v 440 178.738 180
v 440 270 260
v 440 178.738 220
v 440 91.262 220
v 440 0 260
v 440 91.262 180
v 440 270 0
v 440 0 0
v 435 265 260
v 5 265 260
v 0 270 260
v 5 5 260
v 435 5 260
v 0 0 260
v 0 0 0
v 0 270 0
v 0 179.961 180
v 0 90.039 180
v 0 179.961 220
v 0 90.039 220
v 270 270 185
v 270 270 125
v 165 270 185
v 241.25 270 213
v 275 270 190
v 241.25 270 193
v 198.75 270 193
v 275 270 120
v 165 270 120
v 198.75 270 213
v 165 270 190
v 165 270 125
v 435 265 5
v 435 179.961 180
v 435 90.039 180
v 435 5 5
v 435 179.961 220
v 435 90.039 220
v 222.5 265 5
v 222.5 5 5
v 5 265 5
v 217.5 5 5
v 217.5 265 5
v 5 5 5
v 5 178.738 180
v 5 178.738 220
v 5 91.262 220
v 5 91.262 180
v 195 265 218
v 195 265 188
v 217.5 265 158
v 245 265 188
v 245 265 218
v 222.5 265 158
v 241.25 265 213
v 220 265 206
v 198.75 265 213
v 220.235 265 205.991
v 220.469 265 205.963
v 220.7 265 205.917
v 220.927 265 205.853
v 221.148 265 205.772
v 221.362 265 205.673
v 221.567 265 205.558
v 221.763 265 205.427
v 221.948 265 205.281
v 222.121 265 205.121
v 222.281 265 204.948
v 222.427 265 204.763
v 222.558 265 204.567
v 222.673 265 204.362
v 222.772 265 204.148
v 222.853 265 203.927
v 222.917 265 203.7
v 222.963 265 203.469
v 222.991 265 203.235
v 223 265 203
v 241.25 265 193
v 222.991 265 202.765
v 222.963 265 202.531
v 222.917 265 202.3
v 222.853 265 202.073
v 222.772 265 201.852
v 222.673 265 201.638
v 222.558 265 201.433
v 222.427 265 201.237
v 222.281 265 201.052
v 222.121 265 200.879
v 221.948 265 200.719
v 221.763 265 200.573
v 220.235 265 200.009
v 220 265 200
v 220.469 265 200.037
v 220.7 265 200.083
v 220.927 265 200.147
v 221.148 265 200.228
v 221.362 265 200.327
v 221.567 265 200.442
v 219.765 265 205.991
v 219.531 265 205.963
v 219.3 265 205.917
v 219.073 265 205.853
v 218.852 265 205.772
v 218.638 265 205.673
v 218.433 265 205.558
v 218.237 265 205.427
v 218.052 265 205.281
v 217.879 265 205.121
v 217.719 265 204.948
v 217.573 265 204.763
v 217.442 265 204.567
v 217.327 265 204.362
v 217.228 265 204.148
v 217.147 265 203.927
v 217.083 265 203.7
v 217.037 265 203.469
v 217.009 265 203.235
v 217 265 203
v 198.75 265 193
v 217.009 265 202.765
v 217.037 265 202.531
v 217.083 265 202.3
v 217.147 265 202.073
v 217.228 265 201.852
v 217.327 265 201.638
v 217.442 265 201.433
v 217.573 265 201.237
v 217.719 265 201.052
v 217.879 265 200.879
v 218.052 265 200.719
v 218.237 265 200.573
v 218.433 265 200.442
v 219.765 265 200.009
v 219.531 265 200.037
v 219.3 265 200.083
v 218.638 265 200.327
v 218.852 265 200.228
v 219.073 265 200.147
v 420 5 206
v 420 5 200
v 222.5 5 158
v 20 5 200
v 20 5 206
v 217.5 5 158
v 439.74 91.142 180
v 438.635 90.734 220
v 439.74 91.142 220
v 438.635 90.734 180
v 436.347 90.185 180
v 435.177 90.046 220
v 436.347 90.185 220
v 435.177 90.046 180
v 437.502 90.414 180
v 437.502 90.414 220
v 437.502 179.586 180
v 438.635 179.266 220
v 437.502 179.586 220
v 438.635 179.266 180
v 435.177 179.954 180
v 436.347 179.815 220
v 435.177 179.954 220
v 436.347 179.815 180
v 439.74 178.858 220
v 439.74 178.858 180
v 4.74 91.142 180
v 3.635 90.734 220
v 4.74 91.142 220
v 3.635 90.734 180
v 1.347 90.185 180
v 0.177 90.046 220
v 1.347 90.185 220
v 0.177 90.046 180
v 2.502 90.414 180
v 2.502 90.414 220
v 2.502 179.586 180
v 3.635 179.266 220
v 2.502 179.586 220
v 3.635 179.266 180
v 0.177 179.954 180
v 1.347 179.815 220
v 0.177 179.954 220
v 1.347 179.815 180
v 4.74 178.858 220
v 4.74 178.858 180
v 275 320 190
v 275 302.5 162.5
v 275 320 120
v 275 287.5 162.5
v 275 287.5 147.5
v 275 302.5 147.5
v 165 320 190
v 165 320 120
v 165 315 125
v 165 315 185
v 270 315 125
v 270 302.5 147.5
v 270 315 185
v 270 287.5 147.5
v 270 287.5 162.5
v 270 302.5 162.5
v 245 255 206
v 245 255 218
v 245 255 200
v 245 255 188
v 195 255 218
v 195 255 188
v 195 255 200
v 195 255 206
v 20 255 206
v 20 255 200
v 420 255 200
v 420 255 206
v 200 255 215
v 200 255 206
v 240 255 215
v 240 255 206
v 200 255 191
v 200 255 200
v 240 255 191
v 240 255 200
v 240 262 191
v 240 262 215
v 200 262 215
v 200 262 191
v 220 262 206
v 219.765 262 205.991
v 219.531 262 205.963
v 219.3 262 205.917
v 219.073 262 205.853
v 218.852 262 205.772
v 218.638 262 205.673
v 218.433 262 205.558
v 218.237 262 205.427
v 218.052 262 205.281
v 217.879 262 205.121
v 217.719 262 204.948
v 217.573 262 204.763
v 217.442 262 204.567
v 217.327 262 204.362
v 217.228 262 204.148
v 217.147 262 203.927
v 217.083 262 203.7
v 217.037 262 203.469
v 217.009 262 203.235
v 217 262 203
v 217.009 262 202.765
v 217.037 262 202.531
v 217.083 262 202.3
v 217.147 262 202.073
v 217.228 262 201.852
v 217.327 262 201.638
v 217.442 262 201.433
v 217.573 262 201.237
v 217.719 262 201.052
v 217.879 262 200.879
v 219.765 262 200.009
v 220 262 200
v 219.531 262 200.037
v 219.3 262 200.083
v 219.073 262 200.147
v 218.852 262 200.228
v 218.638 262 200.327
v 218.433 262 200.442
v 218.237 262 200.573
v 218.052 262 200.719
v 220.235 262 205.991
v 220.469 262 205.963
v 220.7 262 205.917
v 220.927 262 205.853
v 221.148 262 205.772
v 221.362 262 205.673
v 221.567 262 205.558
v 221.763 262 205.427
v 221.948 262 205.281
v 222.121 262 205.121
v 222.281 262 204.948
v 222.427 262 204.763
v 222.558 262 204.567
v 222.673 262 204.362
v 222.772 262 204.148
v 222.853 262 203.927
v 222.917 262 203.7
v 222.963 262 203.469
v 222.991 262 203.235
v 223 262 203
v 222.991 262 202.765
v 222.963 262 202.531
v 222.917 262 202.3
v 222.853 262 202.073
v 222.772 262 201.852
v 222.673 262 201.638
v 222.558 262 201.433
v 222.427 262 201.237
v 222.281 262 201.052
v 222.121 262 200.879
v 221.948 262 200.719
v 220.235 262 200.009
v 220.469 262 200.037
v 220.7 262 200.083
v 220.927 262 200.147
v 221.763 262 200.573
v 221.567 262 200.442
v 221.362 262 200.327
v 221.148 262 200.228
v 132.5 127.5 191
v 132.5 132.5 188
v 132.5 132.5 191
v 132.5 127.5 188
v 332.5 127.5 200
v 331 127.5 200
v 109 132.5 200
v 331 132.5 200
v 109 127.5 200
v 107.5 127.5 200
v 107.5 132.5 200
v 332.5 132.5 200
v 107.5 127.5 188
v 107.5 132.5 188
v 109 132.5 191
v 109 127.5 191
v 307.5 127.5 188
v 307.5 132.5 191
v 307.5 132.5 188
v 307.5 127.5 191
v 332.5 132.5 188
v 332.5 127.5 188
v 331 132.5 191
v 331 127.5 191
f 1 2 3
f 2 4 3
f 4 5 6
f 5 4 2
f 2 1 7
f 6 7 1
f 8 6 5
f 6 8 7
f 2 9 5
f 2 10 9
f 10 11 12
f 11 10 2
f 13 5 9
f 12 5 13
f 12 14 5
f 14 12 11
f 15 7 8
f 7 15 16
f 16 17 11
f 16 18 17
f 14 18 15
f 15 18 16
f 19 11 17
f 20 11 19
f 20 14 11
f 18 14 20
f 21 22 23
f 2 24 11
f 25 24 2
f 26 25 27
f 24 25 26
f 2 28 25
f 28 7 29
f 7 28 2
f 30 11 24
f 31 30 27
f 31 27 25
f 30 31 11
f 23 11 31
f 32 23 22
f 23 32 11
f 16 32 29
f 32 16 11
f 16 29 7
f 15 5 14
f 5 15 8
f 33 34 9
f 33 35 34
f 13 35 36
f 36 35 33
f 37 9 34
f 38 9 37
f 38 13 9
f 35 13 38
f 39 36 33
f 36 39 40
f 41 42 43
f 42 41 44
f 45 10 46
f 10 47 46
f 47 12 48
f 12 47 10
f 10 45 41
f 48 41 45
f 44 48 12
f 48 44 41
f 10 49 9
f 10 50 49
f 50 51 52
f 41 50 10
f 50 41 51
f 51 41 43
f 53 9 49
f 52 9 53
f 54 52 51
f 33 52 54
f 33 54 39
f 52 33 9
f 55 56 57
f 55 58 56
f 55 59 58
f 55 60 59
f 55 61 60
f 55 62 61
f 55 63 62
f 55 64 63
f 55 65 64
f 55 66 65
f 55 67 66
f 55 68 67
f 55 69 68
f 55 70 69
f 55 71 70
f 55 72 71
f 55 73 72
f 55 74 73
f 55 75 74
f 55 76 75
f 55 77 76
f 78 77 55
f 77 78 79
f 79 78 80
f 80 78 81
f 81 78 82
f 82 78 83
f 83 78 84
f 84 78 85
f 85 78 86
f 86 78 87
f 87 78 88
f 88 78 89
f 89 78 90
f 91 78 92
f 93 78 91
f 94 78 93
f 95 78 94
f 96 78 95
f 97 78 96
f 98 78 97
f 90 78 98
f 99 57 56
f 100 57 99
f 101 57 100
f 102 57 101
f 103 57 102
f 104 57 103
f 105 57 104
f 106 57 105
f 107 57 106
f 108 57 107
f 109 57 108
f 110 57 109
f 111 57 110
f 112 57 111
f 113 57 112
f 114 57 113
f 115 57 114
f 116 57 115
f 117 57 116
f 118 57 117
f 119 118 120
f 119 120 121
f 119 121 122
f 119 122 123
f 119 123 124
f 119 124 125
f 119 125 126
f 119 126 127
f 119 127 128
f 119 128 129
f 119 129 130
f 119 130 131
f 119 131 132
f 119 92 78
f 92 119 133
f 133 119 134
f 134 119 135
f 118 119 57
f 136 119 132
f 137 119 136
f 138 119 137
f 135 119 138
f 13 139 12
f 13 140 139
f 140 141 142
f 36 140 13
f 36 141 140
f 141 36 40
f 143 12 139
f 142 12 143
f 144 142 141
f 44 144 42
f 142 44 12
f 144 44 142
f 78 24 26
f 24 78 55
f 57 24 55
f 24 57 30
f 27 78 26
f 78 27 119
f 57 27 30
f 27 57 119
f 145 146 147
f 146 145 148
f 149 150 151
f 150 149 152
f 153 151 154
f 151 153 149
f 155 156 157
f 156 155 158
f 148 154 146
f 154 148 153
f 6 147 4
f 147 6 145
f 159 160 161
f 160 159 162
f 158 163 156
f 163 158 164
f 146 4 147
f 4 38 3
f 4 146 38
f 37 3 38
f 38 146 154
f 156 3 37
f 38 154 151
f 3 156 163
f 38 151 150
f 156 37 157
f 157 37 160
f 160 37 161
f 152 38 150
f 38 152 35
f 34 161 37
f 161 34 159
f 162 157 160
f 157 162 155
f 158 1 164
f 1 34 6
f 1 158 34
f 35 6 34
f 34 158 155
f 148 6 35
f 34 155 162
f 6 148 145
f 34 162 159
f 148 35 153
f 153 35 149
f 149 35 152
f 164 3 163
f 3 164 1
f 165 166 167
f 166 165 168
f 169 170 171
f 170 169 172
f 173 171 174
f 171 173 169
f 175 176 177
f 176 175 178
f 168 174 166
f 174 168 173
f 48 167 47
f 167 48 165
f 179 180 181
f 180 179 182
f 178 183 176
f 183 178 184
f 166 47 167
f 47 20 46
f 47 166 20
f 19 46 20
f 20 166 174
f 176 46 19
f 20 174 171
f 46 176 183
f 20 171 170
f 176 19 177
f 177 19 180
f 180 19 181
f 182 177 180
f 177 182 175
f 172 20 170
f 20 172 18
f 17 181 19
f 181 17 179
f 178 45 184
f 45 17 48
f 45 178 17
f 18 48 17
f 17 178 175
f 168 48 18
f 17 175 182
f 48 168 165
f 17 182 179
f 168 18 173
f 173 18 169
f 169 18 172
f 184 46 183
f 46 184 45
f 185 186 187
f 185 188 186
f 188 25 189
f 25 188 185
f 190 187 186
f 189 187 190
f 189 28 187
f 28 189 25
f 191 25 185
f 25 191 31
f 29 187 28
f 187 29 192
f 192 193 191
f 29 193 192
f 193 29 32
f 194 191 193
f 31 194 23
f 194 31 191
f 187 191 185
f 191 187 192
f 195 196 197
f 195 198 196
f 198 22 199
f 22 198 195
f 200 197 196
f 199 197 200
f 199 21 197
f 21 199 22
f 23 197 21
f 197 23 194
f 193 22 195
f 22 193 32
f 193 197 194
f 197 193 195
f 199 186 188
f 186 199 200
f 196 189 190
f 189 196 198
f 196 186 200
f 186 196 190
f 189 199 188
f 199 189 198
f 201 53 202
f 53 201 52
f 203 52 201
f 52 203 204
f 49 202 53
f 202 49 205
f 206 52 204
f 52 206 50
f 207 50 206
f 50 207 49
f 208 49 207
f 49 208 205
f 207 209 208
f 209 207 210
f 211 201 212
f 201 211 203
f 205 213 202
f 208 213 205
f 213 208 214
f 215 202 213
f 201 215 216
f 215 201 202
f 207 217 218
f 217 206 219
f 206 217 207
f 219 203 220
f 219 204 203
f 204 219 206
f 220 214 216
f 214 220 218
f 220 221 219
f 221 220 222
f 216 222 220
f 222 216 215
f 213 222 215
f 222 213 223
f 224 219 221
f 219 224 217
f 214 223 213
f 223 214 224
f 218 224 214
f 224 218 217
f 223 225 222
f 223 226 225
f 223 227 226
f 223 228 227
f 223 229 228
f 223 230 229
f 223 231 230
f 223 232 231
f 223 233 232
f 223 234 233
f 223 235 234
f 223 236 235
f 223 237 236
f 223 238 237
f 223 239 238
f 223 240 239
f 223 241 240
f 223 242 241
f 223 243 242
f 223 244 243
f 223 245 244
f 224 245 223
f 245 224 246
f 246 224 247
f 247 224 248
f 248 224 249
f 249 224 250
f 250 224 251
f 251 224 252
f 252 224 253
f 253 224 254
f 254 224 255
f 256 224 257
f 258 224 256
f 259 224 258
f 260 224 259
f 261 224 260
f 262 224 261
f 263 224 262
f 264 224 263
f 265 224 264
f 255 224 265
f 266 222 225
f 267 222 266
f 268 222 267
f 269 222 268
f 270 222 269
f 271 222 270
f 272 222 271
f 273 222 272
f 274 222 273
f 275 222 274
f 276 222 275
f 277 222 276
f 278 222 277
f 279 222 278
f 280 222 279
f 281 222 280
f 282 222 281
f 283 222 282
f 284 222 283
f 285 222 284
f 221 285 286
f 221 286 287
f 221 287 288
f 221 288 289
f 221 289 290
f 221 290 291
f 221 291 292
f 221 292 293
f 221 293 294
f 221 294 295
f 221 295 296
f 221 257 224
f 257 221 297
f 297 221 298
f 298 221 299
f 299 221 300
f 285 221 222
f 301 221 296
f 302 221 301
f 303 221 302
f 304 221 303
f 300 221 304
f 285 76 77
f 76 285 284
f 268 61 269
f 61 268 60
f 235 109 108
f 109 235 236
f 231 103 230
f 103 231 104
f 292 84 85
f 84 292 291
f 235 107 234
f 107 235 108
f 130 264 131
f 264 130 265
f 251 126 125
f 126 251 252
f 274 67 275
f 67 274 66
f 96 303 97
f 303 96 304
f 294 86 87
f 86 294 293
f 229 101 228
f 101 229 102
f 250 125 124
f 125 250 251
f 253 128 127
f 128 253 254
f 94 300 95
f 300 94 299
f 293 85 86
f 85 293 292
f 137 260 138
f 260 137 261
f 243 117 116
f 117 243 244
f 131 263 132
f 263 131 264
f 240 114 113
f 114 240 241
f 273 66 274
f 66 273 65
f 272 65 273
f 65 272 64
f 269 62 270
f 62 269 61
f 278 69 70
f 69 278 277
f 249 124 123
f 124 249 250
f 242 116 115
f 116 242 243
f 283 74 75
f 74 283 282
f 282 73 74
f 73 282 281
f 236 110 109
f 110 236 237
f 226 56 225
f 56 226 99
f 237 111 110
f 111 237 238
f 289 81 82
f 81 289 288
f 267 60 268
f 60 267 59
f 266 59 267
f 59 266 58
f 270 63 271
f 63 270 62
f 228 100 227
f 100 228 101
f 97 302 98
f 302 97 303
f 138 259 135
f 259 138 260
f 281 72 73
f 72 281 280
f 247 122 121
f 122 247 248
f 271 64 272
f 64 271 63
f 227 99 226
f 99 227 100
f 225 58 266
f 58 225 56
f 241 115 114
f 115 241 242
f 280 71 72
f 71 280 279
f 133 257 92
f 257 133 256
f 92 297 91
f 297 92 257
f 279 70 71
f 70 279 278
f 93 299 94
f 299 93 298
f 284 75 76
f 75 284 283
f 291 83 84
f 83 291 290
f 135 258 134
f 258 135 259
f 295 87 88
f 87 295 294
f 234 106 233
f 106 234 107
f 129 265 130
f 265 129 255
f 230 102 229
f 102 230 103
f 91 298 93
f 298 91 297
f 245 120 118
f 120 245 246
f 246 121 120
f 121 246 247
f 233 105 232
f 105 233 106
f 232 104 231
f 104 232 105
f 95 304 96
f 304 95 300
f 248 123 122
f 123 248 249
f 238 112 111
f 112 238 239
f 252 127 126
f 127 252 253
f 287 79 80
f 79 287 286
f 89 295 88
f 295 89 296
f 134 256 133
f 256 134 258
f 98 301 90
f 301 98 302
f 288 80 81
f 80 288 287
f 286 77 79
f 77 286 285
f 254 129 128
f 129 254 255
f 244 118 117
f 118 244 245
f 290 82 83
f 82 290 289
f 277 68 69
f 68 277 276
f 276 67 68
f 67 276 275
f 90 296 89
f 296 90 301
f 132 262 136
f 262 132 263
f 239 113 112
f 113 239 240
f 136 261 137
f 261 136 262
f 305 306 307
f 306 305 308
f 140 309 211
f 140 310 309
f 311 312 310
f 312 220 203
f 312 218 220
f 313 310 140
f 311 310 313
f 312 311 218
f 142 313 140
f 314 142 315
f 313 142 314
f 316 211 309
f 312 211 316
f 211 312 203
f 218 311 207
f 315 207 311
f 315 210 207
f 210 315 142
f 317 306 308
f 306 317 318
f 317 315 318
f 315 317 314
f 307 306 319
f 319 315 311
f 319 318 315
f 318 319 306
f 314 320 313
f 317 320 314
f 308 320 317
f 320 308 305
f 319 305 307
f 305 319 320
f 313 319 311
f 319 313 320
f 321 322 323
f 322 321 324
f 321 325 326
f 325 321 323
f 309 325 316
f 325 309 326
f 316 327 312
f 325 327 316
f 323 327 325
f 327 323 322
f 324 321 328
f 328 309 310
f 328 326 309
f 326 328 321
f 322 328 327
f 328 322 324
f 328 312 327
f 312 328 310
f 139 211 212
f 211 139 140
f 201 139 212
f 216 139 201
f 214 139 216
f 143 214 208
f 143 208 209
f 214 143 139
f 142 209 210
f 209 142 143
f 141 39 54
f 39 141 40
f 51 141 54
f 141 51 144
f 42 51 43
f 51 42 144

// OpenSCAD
// =========================================================================
// مشروع الصندوق الهندسي - إصدار متكامل ومعدل الأبعاد بالكامل
// نقطة الأصل (0,0,0) هي الكورنر (تحت - شمال - وراء)
// جميع الأبعاد بالمليمتر (mm)
// =========================================================================

$fn = 80; // تنعيم عالي للأجزاء الدائرية

// --- الأبعاد الهيكلية الأساسية الجديدة (تعديل الأبعاد حسب طلبك) ---
box_w = 440;  // العرض: أكتر من 40 وأقل من 46 سنتي (اخترنا 440 مم)
box_l = 270;  // الطول: أكتر من 25 وأقل من 27 سنتي (اخترنا 270 مم لاستيعاب اللوح تماماً)
box_h = 260;  // الارتفاع: أكتر من 24 وأقل من 28 سنتي (اخترنا 260 مم)
wall_t = 5;   

// بيت الدائرة (نفس الأبعاد بدون تصغير)
circuit_w = 110;
circuit_h = 70;
circuit_d = 50;

// فتحة الموتور (نفس الأبعاد بدون تصغير)
servo_w = 42.5;
servo_h = 20;

// اللوح الداخلي (نفس الأبعاد بدون تصغير)
plate_w = 400;
plate_l = 250;
plate_t = 6; 

// الفاصل السفلي (تم تعديل العرض ليصبح نصف سنتي = 5 مم)
separator_w = 5; 
separator_h = box_h - 107; // تعديل تلقائي للارتفاع ليحافظ على مكانه الصحيح أسفل الموتور

// أبعاد جيب مروحة السيرفو
pocket_w = 50;
pocket_h = 30;
pocket_d = 10;

// --- [أبعاد الخطافات المعتمدة من طرفك] ---
hook_w = 25;  
hook_l = 5;   
hook_h = 12;  

// --- الأكواد اللونية لمحاكاة الخشب ---
wood_light = [0.85, 0.70, 0.50];  
wood_dark  = [0.60, 0.40, 0.20];  
wood_frame = [0.73, 0.56, 0.36];  

// --- استدعاء التجميعة الكاملة ---
main_assembly();

module main_assembly() {
    
    // 1. الهيكل الخارجي للصندوق الخشبي مع المقابض والفتحات
    color(wood_frame) {
        difference() {
            cube([box_w, box_l, box_h]);
            
            // التجويف الداخلي للصندوق
            translate([wall_t, wall_t, wall_t])
                cube([box_w - 2*wall_t, box_l - 2*wall_t, box_h]);
            
            // فتحة الموتور الدقيقة موسطة تماماً على الواجهة الأمامية
            translate([(box_w/2) - (servo_w/2), box_l - wall_t - 1, box_h - 67]) 
                cube([servo_w, wall_t + 2, servo_h]);
                
            // مقبض الحمل الأيمن
            translate([box_w - wall_t - 1, box_l/2 - 50, box_h - 80])
                handle_slot();
                
            // مقبض الحمل الأيسر
            translate([-1, box_l/2 - 50, box_h - 80])
                handle_slot();
        }
    }
    
    // 2. بيت الدائرة الخارجي (Circuit House) - موسط ومفتوح يساراً وبفتحة سلك يميناً
    color(wood_light) {
        translate([(box_w/2) - (circuit_w/2), box_l, box_h - 140]) {
            difference() {
                cube([circuit_w, circuit_d, circuit_h]);
                
                // فتحة الجانب الأيسر لدخول الدائرة سليدنج
                translate([-1, -1, wall_t])
                    cube([circuit_w - wall_t + 1, circuit_d - wall_t + 1, circuit_h - 2*wall_t]);
                
                // فتحة السلك المربعة (15x15 مم) على اليمين
                translate([circuit_w - wall_t - 1, (circuit_d - 15)/2, (circuit_h - 15)/2])
                    cube([wall_t + 2, 15, 15]);
            }
        }
    }
    
    // 3. الفاصل السفلي الثابت (موسط تماماً وبعرض 5 مم)
    color(wood_dark) {
        translate([(box_w/2) - (separator_w/2), wall_t, wall_t])
            cube([separator_w, box_l - 2*wall_t, separator_h]);
    }
    
    // 4. اللوح الداخلي المتحرك - متناسق وموسط تماماً مع الأبعاد الجديدة
    translate([box_w/2, box_l - 15, box_h - 57]) 
        rotate([0, 0, 0]) // زاوية الدوران التجريبية للموتور
            tilting_plate_assembly();
}

// موديول مقبض اليد
module handle_slot() {
    hull() {
        translate([0, 20, 0]) cylinder(h=40, r=15, center=false);
        translate([0, 80, 0]) cylinder(h=40, r=15, center=false);
    }
}

// موديول مخصص لبناء الخطاف الواحد بالأبعاد المطلوبة وتفريغه داخلياً
module single_hook() {
    difference() {
        cube([hook_w, hook_l, hook_h]);
        
        // التجويف الداخلي للخطاف ليصبح كالحاضن أو المجرى
        translate([1.5, -1, 3])
            cube([hook_w - 1.5 + 1, hook_l + 2, hook_h - 3 + 1]);
    }
}

// موديول اللوح الداخلي المتكامل مع شفة الجيب والخطافات السفلية
module tilting_plate_assembly() {
    // أ) اللوح الأفقي الأساسي
    color(wood_light) {
        translate([-plate_w/2, -plate_l, -plate_t/2])
            cube([plate_w, plate_l, plate_t]);
    }
    
    // ب) جيب مروحة السيرفو (الشفة البارزة بين اللوح والفتحة)
    color(wood_dark) {
        translate([-pocket_w/2, 0, -pocket_h/2]) {
            difference() {
                cube([pocket_w, pocket_d, pocket_h]);
                translate([(pocket_w - 40)/2, -1, (pocket_h - 24)/2])
                    cube([40, 8, 24]);
                translate([pocket_w/2, pocket_d + 1, pocket_h/2])
                    rotate([90, 0, 0])
                        cylinder(h = pocket_d + 2, r = 3);
            }
        }
    }
    
    // ج) الخطاف الأيسر (بين الربع 1 و 2 في منتصف الطول تماماً، لازق تحت اللوح)
    translate([-plate_w/4 - hook_w/2, -plate_l/2 - hook_l/2, -plate_t/2 - hook_h])
        color(wood_dark) 
            single_hook();

    // د) الخطاف الأيمن (بين الربع 3 و 4 في منتصف الطول تماماً، لازق تحت اللوح)
    translate([plate_w/4 + hook_w/2, -plate_l/2 - hook_l/2, -plate_t/2 - hook_h])
        mirror([1, 0, 0])
            color(wood_dark) 
                single_hook();
}
